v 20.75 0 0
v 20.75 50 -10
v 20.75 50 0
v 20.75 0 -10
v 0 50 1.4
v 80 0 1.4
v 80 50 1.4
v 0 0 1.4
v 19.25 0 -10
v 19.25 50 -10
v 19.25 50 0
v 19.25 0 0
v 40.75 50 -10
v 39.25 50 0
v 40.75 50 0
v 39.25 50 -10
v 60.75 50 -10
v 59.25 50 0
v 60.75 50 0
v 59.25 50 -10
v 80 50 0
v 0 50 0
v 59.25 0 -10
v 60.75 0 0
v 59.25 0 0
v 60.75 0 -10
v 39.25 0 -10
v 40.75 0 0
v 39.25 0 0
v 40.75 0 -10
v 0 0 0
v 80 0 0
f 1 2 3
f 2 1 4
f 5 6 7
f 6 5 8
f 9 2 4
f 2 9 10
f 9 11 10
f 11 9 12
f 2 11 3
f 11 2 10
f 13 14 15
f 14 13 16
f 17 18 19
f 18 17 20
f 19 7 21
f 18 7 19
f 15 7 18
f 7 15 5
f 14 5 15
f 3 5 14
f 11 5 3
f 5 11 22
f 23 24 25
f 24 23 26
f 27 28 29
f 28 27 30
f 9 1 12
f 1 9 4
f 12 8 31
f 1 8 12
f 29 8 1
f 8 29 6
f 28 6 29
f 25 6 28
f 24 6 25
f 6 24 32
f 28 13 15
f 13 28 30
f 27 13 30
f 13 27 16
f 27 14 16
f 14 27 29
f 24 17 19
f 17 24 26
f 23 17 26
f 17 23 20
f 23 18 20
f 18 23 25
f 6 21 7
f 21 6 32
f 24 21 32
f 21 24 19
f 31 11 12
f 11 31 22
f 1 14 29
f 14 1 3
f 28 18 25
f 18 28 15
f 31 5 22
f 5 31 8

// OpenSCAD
$fn = 32;

// ----------------------------------------------------------------------
// Ribbed panel: 1.4 mm panel
// ----------------------------------------------------------------------

// --- parameters (mm) ---
panel_l = 80;             // panel length, X
panel_w = 50;             // panel width, Y
panel_t = 1.4;            // panel thickness, Z
rib_t = 1.5;              // rib thickness
rib_h = 10;               // rib height below the panel
ribs = 3;                 // number of ribs
fit_tol = 0.05;           // tolerance for press fits, mm
free_tol = 0.2;           // tolerance for clearance fits, mm

total_h = panel_t + rib_h;  // overall height

union() {
  cube([panel_l, panel_w, panel_t]);
  for (i = [1 : ribs])
    translate([i * panel_l / (ribs + 1) - rib_t / 2, 0, -rib_h])
      cube([rib_t, panel_w, rib_h + panel_t]);
}
